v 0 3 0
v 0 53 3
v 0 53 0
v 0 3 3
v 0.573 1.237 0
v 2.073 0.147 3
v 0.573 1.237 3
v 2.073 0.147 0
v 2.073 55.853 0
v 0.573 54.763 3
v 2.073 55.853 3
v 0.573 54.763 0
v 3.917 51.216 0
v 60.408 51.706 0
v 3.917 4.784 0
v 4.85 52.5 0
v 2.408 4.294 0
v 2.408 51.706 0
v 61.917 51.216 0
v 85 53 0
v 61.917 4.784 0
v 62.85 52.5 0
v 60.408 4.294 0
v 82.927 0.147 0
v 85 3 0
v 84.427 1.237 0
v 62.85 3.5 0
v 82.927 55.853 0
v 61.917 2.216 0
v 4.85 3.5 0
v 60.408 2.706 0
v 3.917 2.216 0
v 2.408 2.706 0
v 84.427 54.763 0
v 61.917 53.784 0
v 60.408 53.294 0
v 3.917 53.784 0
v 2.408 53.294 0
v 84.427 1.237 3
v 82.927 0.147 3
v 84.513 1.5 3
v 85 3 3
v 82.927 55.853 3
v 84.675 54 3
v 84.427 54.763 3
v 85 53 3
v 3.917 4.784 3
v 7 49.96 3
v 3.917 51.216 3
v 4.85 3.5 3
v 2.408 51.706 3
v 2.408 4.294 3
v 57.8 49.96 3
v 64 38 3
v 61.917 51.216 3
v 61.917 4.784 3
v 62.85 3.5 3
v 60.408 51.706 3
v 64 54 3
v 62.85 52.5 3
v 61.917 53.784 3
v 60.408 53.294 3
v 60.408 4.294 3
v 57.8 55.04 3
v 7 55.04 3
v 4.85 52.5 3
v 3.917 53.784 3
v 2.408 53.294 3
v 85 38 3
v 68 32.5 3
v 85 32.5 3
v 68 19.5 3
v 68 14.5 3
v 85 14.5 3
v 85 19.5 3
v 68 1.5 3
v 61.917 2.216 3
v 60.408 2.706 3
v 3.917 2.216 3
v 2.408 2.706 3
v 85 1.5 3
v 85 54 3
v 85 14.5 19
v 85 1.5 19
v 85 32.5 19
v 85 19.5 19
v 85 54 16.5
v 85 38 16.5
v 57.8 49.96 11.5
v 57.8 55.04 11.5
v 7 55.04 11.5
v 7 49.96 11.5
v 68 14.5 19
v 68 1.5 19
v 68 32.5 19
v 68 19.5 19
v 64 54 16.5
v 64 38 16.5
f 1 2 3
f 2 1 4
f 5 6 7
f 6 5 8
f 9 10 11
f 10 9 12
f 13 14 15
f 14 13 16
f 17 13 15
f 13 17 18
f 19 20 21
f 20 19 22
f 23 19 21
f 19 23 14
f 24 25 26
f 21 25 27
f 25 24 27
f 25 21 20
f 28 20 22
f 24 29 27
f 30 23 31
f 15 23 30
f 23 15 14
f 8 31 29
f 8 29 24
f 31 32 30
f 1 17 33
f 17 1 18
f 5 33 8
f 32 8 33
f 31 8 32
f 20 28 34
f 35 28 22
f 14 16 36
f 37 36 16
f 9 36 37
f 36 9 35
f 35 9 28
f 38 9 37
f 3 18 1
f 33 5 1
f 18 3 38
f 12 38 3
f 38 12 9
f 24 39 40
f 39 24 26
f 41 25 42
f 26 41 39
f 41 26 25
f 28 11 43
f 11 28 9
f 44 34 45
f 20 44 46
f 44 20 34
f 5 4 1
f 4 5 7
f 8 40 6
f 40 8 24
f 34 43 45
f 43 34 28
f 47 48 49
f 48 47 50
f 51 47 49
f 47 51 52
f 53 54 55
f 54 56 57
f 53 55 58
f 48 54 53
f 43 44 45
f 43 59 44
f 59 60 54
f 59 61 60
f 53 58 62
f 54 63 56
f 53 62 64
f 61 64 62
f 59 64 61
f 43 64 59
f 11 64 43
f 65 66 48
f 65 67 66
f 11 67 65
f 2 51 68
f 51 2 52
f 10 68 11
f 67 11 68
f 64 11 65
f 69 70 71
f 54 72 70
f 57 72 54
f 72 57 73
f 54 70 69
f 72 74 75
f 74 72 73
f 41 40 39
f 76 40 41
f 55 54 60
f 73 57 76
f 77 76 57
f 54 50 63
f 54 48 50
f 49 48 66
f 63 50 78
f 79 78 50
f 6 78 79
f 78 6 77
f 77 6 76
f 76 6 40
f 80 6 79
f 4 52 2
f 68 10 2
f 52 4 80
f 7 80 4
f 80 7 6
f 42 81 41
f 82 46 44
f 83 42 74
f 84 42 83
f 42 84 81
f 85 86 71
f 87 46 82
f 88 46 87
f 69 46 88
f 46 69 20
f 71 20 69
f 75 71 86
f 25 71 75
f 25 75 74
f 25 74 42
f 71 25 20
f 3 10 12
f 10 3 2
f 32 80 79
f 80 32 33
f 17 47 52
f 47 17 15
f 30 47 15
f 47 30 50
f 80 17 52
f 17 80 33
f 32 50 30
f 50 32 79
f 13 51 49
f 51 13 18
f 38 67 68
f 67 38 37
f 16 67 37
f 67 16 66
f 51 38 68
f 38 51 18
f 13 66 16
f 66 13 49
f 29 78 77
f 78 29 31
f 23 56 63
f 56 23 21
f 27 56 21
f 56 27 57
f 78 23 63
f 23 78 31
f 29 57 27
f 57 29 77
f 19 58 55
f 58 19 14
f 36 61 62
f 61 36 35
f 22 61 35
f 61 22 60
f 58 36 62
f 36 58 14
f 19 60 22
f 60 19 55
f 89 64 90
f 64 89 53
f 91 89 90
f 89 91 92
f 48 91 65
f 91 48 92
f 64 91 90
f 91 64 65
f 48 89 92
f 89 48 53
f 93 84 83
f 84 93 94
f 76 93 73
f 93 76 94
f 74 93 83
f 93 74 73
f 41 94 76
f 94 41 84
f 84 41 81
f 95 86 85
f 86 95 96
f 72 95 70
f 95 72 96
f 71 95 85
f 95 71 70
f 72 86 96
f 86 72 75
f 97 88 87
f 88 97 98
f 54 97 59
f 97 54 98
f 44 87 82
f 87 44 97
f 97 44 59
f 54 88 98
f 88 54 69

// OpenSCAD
module rpi_4(){
   color("green")render()difference(){
           translate([3,3,0])minkowski(){
//PCB outline

        cube([85-6,56-6,2]); 
        cylinder(r=3, h=1); 
       }
       
//holes       
       translate([3.5,3.5,0])cylinder(h=3,r=2.7/2);
       translate([3.5,56-3.5,0])cylinder(h=3,r=2.7/2); 
       
       translate([3.5+29+29,3.5,0])cylinder(h=3,r=2.7/2);
       translate([3.5+29+29,56-3.5,0])cylinder(h=3,r=2.7/2);
          
   }
   
//GPIO
   color("silver")translate([7,3.5+49-2.54,3])cube([2.54*20,2.54*2,8.5]);
   
//PORTS
   
    //USB
    color("silver")translate([85-17,1.5,3])cube([17,13,16]);
   
    color("silver")translate([85-17,1.5+13+5,3])cube([17,13,16]);
    //ETHERNET
    color("silver")translate([85-21,56-16-2,3])cube([21,16,13.5]);
}


rpi_4();
